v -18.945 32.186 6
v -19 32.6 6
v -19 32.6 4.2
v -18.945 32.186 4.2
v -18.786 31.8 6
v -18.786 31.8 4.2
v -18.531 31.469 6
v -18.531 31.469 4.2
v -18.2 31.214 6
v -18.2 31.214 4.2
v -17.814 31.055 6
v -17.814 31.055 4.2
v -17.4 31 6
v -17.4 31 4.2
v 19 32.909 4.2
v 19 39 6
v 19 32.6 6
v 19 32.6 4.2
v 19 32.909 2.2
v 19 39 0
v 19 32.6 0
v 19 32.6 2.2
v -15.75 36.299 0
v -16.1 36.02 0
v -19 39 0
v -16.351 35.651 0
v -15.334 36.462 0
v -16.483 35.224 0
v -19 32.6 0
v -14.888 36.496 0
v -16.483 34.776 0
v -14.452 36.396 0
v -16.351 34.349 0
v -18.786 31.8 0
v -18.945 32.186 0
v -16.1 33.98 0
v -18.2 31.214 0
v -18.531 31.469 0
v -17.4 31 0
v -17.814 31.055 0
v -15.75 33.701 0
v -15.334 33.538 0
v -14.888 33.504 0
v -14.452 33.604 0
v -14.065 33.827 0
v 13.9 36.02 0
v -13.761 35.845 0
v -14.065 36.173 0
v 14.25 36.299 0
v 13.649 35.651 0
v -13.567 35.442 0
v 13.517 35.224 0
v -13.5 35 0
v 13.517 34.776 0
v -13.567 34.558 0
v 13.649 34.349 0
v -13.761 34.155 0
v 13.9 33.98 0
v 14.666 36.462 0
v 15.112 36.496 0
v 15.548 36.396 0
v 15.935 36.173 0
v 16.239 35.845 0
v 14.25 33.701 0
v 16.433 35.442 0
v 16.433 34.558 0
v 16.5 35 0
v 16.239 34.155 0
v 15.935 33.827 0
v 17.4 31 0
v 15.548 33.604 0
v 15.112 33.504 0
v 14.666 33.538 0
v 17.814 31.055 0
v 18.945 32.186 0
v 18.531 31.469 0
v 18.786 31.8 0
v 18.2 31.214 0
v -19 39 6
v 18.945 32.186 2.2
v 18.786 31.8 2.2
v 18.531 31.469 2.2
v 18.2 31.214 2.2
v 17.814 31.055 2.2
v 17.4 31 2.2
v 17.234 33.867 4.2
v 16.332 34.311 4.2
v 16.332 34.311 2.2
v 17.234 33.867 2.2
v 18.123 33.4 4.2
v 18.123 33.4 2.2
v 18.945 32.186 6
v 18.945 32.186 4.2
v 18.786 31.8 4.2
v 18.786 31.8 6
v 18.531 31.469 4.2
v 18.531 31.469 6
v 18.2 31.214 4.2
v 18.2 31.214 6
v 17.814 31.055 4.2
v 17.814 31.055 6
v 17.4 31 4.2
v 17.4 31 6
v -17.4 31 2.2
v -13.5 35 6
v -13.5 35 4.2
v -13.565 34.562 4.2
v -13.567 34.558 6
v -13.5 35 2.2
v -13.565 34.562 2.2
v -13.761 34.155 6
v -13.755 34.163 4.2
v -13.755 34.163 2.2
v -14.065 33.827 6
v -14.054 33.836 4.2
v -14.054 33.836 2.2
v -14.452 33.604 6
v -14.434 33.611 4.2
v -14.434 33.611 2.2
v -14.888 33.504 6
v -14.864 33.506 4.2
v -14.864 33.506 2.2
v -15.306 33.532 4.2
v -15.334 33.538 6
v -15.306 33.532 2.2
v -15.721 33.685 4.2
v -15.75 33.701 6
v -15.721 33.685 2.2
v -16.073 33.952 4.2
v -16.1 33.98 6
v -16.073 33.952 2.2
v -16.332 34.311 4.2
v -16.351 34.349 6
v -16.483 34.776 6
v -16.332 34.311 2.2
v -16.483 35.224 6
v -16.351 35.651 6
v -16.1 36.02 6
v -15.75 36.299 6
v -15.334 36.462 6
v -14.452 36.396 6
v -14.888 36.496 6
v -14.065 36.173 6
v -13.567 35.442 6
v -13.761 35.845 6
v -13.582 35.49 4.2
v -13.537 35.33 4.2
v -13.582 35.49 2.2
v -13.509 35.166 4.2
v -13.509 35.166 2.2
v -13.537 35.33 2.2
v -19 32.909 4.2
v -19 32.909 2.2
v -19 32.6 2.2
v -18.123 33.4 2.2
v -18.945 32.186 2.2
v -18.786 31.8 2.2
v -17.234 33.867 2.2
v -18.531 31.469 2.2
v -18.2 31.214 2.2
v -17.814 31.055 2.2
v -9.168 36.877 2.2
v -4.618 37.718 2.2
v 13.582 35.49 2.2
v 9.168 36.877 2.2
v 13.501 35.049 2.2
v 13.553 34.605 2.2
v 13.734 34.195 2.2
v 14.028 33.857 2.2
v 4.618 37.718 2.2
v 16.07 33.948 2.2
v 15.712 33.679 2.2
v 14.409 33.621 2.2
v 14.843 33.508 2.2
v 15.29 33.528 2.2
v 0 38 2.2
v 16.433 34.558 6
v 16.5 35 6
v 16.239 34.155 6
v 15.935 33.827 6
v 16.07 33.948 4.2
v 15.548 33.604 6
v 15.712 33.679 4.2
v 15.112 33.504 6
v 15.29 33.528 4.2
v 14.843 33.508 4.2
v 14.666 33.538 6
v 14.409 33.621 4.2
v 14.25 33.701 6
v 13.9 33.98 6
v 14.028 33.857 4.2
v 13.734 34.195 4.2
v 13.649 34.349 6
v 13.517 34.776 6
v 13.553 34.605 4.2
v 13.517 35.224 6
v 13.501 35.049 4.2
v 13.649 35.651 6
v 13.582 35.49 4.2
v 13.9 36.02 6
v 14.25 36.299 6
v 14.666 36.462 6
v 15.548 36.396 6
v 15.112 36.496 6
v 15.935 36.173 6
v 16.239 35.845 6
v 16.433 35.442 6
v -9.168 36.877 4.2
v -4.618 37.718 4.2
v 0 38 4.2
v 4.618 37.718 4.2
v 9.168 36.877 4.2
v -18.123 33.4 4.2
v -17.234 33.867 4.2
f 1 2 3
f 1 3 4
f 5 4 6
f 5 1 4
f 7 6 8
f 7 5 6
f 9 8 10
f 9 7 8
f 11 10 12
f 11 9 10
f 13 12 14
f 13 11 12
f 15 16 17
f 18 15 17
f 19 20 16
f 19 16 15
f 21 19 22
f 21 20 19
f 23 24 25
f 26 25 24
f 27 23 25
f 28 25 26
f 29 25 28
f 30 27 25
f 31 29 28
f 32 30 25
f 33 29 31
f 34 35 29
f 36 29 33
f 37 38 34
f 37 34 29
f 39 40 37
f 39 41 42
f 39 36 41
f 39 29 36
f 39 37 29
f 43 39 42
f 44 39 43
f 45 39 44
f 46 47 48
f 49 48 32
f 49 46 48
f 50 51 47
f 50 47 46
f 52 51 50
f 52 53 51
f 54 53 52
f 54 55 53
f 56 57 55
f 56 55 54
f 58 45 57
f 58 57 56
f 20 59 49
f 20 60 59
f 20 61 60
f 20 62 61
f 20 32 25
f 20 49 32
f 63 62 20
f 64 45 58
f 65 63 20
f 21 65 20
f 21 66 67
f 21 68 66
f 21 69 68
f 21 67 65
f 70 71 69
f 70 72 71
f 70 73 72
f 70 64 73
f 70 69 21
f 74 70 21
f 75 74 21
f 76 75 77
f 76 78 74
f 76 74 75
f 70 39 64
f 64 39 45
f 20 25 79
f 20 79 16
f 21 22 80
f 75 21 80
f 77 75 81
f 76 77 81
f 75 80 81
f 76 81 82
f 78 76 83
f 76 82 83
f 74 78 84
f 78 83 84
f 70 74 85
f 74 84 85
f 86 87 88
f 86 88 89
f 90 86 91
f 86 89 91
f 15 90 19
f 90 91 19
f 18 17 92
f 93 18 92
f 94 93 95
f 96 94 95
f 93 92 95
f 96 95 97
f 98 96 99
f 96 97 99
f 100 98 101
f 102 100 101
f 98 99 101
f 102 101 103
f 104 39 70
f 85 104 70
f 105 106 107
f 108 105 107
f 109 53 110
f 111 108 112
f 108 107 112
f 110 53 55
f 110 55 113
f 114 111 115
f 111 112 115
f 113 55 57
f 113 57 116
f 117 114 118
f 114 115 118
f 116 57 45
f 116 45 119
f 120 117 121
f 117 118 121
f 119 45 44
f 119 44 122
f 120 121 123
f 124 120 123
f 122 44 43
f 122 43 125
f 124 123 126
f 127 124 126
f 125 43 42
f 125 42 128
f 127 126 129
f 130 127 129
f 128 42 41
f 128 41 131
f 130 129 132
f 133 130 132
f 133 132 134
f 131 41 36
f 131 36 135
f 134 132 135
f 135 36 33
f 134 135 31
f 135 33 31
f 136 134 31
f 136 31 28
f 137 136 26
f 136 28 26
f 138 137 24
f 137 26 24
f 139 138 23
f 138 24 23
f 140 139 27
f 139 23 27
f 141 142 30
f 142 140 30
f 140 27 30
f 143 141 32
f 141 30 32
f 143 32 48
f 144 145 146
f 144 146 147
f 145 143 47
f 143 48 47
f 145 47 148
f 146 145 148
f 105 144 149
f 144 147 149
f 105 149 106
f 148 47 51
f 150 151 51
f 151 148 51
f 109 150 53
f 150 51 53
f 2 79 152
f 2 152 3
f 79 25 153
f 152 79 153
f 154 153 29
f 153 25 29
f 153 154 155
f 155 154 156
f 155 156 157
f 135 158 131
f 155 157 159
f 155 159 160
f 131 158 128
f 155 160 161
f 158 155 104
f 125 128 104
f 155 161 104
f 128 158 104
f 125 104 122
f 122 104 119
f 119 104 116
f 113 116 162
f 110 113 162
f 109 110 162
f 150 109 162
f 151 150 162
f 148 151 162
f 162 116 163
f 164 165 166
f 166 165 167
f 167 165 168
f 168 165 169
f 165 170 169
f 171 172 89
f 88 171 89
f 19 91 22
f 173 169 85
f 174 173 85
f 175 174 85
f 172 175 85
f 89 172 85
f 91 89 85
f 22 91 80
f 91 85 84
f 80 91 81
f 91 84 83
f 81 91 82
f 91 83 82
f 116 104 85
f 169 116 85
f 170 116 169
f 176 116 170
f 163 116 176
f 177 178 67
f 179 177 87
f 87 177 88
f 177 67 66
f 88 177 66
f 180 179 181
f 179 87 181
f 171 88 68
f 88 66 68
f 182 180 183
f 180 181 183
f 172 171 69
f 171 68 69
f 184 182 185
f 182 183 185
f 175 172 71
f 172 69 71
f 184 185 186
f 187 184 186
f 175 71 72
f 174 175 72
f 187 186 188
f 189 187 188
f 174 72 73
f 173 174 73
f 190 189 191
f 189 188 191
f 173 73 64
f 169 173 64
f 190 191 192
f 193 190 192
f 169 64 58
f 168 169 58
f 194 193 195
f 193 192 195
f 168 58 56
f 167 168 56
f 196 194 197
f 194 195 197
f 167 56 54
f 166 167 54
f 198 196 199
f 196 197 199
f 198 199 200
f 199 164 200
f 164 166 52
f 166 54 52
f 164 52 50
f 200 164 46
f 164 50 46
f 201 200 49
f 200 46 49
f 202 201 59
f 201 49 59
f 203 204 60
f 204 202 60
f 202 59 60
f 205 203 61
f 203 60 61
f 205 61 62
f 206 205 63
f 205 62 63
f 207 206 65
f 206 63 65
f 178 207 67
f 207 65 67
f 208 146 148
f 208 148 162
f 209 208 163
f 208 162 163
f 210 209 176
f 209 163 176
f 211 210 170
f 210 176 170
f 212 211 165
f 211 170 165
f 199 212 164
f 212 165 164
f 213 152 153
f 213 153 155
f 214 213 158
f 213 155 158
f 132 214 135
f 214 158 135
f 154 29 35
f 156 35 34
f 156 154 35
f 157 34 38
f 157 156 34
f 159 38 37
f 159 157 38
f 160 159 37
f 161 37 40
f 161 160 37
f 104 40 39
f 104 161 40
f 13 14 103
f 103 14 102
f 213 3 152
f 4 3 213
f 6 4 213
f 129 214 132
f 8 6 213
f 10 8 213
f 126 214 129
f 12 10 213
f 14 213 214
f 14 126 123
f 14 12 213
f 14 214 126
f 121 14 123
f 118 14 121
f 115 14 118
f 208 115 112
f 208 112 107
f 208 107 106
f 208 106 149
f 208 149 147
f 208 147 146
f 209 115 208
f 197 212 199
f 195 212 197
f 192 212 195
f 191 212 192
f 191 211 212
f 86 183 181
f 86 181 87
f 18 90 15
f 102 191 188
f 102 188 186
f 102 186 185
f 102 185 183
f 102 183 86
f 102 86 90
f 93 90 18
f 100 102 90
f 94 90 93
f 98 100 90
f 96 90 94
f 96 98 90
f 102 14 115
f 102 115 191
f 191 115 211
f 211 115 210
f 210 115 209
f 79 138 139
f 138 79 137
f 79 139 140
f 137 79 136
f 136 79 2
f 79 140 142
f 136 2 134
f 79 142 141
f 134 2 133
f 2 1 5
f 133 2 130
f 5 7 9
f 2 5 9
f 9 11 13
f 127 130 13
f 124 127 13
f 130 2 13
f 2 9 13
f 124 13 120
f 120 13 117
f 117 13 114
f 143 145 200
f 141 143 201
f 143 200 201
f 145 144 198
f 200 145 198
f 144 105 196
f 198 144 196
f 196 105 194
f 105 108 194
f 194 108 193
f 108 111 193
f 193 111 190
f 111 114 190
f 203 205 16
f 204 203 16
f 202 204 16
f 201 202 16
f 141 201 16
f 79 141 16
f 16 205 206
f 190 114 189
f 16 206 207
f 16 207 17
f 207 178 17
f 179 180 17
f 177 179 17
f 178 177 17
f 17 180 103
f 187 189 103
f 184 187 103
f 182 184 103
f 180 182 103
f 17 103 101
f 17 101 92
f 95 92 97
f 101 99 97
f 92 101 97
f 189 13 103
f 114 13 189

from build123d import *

# Parameters (mm, degrees)
CYLINDER028_R     = 38
CYLINDER028_DEPTH = 2
CYLINDER031_R     = 1.5
CYLINDER031_DEPTH = 10
CYLINDER032_R     = 1.5
CYLINDER032_DEPTH = 10
BOX033_W          = 38
BOX033_H          = 8
BOX033_DEPTH      = 6
FILLET006_R       = 1.6


with BuildPart() as cylinder007:
    # Cylinder028 → Cylinder028 (new body)
    with BuildSketch(Plane.XY.offset(2.2)):
        Circle(CYLINDER028_R)
    extrude(amount=CYLINDER028_DEPTH)


with BuildPart() as cylinder010:
    # Cylinder031 → Cylinder031 (new body)
    with BuildSketch(Plane(origin=(-15, -35, 0), x_dir=(1, 0, 0), z_dir=(0, 0, 1))):
        Circle(CYLINDER031_R)
    extrude(amount=CYLINDER031_DEPTH)


with BuildPart() as fusion017:
    # Cylinder032 → Cylinder032 (new body)
    with BuildSketch(Plane(origin=(15, -35, 0), x_dir=(1, 0, 0), z_dir=(0, 0, 1))):
        Circle(CYLINDER032_R)
    extrude(amount=CYLINDER032_DEPTH)

    # Fusion017: union Cylinder010
    add(cylinder010.part)


with BuildPart() as cut031:
    # Box033 → Box033 (new body)
    with BuildSketch(Plane(origin=(-19, -39, 0), x_dir=(1, 0, 0), z_dir=(0, 0, 1))):
        with Locations((19, 4)):
            Rectangle(BOX033_W, BOX033_H)
    extrude(amount=BOX033_DEPTH)

    # Fillet006
    fillet006_edges = [cut031.edges().sort_by_distance(p)[0] for p in [
        (-19, -31, 3),
        (19, -31, 3),
    ]]
    fillet(fillet006_edges, radius=FILLET006_R)

    # Cut030: cut Fusion017
    add(fusion017.part, mode=Mode.SUBTRACT)

    # Cut031: cut Cylinder007
    add(cylinder007.part, mode=Mode.SUBTRACT)


with BuildPart() as part_mirroring003:
    # Part__Mirroring003: instance of Cut031
    add(cut031.part.mirror(Plane(origin=(0, 0, 0), x_dir=(1, 0, 0), z_dir=(0, 1, 0))))


solid = part_mirroring003.part
